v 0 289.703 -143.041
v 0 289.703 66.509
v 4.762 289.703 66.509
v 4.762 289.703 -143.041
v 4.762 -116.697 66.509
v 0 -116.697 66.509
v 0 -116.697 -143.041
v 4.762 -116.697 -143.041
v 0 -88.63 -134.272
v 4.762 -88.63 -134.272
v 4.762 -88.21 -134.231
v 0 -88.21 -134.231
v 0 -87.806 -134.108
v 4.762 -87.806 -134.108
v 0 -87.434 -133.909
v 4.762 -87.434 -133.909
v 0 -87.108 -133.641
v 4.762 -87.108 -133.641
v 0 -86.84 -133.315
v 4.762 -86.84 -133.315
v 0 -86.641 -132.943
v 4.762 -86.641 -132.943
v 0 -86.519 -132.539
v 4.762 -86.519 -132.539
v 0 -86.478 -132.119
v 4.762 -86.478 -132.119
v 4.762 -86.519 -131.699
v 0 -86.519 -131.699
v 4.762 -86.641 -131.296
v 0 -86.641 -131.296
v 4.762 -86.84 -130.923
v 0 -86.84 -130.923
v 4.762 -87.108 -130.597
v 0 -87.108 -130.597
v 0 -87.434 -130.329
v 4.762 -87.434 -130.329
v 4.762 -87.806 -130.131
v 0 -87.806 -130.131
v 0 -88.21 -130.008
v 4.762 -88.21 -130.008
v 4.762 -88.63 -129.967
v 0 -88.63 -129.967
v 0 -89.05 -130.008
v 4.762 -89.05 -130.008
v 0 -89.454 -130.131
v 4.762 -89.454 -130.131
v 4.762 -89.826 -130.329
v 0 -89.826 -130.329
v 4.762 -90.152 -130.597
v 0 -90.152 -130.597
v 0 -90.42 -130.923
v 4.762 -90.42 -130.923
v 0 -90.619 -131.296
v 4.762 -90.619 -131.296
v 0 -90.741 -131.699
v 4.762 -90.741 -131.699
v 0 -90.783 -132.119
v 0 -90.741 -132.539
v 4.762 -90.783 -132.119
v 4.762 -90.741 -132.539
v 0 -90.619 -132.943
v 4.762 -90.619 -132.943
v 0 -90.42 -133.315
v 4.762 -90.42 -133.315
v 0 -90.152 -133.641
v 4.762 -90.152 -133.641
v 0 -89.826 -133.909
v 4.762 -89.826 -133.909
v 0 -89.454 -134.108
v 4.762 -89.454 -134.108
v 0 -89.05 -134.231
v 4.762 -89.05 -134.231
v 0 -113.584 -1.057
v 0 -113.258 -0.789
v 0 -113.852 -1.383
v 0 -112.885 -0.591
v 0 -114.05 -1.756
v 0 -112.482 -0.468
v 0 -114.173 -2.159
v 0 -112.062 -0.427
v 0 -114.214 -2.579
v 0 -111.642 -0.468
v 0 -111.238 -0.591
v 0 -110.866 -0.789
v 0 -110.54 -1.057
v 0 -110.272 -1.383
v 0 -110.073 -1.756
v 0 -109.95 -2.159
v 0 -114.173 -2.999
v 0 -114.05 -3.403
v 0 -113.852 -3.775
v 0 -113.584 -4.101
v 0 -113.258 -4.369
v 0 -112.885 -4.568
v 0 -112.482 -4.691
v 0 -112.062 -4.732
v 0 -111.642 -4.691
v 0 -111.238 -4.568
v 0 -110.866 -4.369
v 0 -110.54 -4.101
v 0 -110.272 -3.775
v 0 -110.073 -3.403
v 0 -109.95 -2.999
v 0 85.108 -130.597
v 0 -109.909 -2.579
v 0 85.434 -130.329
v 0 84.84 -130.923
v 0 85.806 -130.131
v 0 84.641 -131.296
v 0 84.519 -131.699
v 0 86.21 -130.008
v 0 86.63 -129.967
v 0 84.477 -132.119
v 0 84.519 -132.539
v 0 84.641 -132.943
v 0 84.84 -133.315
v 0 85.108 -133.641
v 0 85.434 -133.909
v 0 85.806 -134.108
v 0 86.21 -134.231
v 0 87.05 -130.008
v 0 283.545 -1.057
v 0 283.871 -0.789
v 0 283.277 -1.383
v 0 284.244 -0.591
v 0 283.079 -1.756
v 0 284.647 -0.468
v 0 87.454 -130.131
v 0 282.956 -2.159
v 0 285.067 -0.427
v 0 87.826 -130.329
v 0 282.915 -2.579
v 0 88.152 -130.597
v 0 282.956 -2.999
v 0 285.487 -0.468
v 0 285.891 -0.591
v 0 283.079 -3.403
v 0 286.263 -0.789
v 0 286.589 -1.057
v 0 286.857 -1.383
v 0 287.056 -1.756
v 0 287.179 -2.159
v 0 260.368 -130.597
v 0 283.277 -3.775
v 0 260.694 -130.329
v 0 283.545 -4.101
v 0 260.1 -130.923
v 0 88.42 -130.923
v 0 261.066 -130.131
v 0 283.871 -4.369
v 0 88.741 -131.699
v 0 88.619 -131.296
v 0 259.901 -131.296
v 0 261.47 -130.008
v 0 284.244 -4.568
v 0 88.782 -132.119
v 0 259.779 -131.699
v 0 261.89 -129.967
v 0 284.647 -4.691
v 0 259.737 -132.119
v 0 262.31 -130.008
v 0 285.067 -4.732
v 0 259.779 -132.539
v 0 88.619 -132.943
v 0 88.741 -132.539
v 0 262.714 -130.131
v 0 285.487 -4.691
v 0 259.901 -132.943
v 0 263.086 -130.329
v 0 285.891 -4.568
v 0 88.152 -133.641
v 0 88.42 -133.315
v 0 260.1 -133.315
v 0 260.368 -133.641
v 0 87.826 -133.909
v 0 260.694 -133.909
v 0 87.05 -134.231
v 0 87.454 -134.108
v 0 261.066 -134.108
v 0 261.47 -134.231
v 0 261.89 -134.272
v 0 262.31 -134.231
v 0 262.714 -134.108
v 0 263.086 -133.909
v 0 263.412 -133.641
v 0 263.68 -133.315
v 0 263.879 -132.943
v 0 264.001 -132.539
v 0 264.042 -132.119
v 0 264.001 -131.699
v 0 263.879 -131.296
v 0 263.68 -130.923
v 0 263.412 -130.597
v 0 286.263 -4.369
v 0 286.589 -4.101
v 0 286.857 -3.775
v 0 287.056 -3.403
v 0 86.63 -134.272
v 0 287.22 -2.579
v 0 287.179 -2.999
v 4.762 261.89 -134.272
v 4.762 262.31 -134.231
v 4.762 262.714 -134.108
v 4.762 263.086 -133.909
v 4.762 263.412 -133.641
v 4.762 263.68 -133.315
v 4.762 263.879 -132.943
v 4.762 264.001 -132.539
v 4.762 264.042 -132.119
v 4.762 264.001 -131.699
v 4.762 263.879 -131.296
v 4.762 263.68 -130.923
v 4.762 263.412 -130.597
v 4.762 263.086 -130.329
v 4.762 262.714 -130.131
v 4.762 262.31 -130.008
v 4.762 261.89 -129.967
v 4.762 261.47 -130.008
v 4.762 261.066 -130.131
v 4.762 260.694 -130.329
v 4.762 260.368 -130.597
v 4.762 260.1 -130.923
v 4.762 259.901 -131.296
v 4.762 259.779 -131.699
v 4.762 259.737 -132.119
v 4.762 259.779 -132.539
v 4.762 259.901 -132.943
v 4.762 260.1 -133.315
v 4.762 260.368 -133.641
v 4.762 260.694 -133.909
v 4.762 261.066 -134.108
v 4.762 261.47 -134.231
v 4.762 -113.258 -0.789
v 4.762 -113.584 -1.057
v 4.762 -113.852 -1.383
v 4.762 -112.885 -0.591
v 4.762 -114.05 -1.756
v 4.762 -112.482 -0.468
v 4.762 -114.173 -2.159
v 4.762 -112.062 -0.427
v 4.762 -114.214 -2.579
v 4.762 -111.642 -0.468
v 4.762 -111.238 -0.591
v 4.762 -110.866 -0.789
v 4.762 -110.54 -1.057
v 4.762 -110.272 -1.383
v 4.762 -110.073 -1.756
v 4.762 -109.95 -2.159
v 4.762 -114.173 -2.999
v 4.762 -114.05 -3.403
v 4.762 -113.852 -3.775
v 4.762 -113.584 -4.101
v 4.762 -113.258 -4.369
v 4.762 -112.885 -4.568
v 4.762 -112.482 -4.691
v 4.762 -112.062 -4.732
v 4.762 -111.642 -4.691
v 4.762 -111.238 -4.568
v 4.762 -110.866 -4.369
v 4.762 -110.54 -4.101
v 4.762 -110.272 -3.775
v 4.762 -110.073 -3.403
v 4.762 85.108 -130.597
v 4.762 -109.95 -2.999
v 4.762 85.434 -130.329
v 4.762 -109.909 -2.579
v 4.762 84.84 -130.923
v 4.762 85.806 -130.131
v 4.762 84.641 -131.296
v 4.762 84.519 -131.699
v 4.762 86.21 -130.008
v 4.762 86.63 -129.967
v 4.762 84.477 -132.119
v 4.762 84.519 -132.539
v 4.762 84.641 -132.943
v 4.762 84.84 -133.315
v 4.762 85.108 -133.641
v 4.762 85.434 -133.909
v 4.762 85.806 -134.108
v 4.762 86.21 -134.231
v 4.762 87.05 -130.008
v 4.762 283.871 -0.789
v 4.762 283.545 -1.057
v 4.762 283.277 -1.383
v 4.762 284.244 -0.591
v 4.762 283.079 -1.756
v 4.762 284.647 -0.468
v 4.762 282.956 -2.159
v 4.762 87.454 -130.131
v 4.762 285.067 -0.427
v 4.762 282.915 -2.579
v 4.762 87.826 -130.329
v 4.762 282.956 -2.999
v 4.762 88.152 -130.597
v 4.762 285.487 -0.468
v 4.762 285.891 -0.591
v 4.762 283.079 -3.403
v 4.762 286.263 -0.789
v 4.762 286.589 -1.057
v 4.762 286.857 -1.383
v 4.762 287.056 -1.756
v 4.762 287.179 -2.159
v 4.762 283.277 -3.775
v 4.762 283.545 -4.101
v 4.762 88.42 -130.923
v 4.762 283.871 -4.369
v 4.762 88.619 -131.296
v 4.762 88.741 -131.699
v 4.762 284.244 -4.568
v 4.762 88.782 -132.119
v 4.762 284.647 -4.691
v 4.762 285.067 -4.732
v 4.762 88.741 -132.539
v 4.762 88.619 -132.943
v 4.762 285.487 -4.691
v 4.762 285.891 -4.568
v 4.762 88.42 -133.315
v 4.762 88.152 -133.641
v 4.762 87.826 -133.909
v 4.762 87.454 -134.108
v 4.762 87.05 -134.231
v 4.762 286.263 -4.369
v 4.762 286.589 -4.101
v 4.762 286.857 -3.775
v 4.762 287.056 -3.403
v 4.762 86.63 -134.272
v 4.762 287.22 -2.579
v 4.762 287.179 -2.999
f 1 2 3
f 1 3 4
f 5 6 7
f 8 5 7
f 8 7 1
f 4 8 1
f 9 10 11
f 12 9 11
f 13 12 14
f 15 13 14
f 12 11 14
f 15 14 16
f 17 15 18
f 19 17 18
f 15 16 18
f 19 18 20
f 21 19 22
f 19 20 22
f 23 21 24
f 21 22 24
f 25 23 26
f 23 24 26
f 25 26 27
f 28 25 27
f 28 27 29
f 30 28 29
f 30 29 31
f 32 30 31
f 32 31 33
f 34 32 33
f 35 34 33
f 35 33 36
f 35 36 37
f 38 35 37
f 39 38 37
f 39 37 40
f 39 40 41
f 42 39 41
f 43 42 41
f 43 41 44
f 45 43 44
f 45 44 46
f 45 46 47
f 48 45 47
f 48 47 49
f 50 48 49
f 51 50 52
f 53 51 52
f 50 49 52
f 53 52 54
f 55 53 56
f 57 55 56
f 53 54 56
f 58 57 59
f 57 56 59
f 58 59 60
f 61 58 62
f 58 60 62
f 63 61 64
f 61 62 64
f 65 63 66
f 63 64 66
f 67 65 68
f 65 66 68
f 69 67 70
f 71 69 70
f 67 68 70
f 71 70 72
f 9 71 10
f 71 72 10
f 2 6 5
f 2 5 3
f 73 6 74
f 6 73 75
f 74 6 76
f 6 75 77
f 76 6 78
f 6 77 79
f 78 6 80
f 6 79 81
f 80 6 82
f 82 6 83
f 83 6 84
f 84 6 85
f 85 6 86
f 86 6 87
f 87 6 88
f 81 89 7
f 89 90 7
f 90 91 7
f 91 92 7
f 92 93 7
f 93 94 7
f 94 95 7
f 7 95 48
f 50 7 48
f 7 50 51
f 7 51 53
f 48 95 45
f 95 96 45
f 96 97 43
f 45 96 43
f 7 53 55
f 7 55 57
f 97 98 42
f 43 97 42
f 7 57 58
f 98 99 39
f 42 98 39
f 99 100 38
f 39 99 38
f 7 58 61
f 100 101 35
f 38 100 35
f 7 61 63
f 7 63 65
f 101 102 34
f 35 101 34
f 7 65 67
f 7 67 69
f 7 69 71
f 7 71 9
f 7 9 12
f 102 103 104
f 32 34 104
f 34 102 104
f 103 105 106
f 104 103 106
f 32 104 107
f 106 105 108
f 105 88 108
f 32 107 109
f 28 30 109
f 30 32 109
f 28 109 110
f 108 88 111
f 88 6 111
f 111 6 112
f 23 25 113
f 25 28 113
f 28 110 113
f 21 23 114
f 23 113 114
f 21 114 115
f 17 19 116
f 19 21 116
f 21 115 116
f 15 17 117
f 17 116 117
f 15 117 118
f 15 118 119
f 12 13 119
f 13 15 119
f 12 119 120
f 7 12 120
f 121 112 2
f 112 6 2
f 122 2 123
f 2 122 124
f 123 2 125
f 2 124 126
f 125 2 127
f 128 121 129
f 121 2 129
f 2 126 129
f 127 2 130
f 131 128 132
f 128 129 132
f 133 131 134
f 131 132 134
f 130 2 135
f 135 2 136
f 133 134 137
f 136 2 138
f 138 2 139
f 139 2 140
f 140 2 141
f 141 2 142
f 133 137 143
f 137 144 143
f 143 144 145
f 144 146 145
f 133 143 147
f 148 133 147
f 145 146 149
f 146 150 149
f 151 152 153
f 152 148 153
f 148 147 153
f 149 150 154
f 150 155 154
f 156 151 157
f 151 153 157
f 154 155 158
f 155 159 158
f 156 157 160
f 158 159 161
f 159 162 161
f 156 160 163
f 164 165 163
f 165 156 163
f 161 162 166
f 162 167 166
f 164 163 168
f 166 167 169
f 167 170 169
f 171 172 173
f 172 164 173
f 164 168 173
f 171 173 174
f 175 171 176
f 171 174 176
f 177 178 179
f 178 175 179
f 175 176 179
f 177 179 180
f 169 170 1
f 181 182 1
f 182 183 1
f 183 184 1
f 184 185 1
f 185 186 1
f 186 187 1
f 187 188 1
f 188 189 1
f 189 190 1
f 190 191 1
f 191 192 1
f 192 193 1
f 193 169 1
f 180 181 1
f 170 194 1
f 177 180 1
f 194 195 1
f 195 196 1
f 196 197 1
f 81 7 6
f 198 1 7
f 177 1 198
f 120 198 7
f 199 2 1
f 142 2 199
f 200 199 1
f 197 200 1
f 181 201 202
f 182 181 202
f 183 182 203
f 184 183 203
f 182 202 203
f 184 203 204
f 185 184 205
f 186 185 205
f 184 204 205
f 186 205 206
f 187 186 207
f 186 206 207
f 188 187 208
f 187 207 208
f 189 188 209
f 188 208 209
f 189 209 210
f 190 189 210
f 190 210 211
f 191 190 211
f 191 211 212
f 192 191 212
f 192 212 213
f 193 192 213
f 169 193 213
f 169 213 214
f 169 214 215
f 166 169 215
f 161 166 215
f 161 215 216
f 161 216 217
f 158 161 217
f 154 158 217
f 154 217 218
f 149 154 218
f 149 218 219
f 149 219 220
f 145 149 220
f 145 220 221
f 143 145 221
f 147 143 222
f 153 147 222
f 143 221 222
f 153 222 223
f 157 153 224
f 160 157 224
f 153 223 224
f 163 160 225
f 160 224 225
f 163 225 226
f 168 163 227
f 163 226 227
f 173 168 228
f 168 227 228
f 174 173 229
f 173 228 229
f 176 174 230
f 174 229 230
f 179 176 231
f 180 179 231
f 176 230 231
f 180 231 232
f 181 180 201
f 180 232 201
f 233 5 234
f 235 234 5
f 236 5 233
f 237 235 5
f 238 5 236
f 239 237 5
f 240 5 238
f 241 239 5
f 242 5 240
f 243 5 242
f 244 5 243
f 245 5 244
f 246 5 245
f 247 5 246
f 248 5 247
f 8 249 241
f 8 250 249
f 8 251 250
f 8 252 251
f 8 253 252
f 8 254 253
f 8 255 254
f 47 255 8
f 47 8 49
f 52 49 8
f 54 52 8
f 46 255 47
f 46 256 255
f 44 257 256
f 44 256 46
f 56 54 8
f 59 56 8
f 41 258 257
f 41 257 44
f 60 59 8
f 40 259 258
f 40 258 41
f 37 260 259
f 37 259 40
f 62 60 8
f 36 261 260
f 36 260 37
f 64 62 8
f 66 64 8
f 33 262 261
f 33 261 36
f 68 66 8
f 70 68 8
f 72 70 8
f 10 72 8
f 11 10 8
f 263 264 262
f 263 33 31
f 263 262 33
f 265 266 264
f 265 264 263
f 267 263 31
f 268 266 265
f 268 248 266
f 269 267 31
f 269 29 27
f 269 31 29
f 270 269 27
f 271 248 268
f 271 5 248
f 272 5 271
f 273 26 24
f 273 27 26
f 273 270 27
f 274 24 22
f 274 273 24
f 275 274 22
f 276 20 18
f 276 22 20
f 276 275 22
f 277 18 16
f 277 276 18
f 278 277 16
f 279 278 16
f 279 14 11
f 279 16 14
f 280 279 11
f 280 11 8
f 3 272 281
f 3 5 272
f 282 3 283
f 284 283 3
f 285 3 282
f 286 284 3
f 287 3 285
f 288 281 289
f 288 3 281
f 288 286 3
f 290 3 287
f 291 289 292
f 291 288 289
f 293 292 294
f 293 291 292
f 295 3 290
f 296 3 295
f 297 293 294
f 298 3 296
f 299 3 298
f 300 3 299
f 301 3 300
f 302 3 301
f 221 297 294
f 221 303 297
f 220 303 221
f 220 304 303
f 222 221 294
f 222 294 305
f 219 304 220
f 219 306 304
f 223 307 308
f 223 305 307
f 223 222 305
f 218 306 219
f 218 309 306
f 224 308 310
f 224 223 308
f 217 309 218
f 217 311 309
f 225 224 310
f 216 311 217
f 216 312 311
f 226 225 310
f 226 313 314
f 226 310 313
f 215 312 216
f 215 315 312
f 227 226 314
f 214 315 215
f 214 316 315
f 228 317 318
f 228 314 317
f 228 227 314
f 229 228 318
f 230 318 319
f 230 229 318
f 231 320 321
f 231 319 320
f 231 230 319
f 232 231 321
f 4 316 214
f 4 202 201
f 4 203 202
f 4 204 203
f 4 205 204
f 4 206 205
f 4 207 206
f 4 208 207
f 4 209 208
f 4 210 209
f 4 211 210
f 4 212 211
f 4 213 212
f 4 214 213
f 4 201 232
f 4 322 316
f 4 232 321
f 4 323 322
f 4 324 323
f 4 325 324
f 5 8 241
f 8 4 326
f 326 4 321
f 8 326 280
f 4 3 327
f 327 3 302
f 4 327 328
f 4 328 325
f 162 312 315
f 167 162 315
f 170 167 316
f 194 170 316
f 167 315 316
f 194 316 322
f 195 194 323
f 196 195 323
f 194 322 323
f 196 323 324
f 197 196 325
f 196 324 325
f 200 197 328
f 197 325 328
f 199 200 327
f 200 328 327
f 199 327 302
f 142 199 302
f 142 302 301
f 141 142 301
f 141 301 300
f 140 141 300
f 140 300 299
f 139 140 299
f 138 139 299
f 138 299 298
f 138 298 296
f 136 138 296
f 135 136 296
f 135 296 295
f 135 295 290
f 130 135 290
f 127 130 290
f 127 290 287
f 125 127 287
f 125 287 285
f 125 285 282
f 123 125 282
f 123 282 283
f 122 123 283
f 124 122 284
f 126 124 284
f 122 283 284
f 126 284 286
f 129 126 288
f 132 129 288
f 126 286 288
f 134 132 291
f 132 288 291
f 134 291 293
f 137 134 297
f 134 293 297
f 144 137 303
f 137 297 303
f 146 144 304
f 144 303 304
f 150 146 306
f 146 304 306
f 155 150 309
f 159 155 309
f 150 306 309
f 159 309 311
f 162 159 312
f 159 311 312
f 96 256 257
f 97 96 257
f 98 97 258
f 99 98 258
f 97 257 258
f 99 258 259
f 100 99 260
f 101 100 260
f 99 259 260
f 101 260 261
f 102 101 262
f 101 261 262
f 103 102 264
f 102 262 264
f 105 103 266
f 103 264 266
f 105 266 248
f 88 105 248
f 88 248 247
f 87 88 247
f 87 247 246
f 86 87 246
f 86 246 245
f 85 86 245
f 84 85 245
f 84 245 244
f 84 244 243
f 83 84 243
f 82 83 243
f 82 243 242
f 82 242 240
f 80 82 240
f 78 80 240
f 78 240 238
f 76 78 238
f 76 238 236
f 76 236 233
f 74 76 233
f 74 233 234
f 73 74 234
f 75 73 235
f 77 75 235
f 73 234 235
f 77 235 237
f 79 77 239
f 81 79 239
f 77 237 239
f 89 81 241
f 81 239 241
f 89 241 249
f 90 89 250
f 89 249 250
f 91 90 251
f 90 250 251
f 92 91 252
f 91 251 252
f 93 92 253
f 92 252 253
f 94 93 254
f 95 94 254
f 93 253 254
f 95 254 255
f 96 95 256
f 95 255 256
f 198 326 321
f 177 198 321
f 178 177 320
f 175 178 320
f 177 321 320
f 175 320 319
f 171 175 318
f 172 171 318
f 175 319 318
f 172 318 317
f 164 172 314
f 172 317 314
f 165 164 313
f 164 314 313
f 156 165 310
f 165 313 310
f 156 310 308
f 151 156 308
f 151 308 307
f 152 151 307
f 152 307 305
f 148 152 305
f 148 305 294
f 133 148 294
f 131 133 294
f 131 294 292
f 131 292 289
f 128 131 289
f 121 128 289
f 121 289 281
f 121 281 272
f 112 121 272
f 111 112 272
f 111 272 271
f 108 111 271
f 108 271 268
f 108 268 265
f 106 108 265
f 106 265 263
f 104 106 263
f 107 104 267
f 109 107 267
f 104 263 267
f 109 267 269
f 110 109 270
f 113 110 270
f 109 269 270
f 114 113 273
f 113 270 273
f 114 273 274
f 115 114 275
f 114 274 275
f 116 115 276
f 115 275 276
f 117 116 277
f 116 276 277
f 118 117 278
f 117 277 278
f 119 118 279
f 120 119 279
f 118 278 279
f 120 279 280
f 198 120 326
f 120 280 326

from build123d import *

# Parameters (mm, degrees)
SKETCH1_W             = 209.55
SKETCH1_H             = 406.4
BOSS_EXTRUDE1_DEPTH   = 4.7625
F_8_CLEARANCE_HOLE1_D = 4.3053


with BuildPart() as part:
    # Sketch1 → Boss-Extrude1 (new body)
    with BuildSketch(Plane(origin=(0, 0, 0), x_dir=(0, 0, -1), z_dir=(1, 0, 0))):
        with Locations((38.266318423, 86.502811245)):
            Rectangle(SKETCH1_W, SKETCH1_H)
    extrude(amount=BOSS_EXTRUDE1_DEPTH)

    # #8 Clearance Hole1 (through all)
    with Locations(Plane.ZY):
        with Locations((-132.119318423, -88.630188755), (-132.119318423, 261.889811245), (-132.119318423, 86.629811245), (-2.579318423, -112.061688755), (-2.579318423, 285.067311245)):
            Hole(F_8_CLEARANCE_HOLE1_D / 2)


solid = part.part
